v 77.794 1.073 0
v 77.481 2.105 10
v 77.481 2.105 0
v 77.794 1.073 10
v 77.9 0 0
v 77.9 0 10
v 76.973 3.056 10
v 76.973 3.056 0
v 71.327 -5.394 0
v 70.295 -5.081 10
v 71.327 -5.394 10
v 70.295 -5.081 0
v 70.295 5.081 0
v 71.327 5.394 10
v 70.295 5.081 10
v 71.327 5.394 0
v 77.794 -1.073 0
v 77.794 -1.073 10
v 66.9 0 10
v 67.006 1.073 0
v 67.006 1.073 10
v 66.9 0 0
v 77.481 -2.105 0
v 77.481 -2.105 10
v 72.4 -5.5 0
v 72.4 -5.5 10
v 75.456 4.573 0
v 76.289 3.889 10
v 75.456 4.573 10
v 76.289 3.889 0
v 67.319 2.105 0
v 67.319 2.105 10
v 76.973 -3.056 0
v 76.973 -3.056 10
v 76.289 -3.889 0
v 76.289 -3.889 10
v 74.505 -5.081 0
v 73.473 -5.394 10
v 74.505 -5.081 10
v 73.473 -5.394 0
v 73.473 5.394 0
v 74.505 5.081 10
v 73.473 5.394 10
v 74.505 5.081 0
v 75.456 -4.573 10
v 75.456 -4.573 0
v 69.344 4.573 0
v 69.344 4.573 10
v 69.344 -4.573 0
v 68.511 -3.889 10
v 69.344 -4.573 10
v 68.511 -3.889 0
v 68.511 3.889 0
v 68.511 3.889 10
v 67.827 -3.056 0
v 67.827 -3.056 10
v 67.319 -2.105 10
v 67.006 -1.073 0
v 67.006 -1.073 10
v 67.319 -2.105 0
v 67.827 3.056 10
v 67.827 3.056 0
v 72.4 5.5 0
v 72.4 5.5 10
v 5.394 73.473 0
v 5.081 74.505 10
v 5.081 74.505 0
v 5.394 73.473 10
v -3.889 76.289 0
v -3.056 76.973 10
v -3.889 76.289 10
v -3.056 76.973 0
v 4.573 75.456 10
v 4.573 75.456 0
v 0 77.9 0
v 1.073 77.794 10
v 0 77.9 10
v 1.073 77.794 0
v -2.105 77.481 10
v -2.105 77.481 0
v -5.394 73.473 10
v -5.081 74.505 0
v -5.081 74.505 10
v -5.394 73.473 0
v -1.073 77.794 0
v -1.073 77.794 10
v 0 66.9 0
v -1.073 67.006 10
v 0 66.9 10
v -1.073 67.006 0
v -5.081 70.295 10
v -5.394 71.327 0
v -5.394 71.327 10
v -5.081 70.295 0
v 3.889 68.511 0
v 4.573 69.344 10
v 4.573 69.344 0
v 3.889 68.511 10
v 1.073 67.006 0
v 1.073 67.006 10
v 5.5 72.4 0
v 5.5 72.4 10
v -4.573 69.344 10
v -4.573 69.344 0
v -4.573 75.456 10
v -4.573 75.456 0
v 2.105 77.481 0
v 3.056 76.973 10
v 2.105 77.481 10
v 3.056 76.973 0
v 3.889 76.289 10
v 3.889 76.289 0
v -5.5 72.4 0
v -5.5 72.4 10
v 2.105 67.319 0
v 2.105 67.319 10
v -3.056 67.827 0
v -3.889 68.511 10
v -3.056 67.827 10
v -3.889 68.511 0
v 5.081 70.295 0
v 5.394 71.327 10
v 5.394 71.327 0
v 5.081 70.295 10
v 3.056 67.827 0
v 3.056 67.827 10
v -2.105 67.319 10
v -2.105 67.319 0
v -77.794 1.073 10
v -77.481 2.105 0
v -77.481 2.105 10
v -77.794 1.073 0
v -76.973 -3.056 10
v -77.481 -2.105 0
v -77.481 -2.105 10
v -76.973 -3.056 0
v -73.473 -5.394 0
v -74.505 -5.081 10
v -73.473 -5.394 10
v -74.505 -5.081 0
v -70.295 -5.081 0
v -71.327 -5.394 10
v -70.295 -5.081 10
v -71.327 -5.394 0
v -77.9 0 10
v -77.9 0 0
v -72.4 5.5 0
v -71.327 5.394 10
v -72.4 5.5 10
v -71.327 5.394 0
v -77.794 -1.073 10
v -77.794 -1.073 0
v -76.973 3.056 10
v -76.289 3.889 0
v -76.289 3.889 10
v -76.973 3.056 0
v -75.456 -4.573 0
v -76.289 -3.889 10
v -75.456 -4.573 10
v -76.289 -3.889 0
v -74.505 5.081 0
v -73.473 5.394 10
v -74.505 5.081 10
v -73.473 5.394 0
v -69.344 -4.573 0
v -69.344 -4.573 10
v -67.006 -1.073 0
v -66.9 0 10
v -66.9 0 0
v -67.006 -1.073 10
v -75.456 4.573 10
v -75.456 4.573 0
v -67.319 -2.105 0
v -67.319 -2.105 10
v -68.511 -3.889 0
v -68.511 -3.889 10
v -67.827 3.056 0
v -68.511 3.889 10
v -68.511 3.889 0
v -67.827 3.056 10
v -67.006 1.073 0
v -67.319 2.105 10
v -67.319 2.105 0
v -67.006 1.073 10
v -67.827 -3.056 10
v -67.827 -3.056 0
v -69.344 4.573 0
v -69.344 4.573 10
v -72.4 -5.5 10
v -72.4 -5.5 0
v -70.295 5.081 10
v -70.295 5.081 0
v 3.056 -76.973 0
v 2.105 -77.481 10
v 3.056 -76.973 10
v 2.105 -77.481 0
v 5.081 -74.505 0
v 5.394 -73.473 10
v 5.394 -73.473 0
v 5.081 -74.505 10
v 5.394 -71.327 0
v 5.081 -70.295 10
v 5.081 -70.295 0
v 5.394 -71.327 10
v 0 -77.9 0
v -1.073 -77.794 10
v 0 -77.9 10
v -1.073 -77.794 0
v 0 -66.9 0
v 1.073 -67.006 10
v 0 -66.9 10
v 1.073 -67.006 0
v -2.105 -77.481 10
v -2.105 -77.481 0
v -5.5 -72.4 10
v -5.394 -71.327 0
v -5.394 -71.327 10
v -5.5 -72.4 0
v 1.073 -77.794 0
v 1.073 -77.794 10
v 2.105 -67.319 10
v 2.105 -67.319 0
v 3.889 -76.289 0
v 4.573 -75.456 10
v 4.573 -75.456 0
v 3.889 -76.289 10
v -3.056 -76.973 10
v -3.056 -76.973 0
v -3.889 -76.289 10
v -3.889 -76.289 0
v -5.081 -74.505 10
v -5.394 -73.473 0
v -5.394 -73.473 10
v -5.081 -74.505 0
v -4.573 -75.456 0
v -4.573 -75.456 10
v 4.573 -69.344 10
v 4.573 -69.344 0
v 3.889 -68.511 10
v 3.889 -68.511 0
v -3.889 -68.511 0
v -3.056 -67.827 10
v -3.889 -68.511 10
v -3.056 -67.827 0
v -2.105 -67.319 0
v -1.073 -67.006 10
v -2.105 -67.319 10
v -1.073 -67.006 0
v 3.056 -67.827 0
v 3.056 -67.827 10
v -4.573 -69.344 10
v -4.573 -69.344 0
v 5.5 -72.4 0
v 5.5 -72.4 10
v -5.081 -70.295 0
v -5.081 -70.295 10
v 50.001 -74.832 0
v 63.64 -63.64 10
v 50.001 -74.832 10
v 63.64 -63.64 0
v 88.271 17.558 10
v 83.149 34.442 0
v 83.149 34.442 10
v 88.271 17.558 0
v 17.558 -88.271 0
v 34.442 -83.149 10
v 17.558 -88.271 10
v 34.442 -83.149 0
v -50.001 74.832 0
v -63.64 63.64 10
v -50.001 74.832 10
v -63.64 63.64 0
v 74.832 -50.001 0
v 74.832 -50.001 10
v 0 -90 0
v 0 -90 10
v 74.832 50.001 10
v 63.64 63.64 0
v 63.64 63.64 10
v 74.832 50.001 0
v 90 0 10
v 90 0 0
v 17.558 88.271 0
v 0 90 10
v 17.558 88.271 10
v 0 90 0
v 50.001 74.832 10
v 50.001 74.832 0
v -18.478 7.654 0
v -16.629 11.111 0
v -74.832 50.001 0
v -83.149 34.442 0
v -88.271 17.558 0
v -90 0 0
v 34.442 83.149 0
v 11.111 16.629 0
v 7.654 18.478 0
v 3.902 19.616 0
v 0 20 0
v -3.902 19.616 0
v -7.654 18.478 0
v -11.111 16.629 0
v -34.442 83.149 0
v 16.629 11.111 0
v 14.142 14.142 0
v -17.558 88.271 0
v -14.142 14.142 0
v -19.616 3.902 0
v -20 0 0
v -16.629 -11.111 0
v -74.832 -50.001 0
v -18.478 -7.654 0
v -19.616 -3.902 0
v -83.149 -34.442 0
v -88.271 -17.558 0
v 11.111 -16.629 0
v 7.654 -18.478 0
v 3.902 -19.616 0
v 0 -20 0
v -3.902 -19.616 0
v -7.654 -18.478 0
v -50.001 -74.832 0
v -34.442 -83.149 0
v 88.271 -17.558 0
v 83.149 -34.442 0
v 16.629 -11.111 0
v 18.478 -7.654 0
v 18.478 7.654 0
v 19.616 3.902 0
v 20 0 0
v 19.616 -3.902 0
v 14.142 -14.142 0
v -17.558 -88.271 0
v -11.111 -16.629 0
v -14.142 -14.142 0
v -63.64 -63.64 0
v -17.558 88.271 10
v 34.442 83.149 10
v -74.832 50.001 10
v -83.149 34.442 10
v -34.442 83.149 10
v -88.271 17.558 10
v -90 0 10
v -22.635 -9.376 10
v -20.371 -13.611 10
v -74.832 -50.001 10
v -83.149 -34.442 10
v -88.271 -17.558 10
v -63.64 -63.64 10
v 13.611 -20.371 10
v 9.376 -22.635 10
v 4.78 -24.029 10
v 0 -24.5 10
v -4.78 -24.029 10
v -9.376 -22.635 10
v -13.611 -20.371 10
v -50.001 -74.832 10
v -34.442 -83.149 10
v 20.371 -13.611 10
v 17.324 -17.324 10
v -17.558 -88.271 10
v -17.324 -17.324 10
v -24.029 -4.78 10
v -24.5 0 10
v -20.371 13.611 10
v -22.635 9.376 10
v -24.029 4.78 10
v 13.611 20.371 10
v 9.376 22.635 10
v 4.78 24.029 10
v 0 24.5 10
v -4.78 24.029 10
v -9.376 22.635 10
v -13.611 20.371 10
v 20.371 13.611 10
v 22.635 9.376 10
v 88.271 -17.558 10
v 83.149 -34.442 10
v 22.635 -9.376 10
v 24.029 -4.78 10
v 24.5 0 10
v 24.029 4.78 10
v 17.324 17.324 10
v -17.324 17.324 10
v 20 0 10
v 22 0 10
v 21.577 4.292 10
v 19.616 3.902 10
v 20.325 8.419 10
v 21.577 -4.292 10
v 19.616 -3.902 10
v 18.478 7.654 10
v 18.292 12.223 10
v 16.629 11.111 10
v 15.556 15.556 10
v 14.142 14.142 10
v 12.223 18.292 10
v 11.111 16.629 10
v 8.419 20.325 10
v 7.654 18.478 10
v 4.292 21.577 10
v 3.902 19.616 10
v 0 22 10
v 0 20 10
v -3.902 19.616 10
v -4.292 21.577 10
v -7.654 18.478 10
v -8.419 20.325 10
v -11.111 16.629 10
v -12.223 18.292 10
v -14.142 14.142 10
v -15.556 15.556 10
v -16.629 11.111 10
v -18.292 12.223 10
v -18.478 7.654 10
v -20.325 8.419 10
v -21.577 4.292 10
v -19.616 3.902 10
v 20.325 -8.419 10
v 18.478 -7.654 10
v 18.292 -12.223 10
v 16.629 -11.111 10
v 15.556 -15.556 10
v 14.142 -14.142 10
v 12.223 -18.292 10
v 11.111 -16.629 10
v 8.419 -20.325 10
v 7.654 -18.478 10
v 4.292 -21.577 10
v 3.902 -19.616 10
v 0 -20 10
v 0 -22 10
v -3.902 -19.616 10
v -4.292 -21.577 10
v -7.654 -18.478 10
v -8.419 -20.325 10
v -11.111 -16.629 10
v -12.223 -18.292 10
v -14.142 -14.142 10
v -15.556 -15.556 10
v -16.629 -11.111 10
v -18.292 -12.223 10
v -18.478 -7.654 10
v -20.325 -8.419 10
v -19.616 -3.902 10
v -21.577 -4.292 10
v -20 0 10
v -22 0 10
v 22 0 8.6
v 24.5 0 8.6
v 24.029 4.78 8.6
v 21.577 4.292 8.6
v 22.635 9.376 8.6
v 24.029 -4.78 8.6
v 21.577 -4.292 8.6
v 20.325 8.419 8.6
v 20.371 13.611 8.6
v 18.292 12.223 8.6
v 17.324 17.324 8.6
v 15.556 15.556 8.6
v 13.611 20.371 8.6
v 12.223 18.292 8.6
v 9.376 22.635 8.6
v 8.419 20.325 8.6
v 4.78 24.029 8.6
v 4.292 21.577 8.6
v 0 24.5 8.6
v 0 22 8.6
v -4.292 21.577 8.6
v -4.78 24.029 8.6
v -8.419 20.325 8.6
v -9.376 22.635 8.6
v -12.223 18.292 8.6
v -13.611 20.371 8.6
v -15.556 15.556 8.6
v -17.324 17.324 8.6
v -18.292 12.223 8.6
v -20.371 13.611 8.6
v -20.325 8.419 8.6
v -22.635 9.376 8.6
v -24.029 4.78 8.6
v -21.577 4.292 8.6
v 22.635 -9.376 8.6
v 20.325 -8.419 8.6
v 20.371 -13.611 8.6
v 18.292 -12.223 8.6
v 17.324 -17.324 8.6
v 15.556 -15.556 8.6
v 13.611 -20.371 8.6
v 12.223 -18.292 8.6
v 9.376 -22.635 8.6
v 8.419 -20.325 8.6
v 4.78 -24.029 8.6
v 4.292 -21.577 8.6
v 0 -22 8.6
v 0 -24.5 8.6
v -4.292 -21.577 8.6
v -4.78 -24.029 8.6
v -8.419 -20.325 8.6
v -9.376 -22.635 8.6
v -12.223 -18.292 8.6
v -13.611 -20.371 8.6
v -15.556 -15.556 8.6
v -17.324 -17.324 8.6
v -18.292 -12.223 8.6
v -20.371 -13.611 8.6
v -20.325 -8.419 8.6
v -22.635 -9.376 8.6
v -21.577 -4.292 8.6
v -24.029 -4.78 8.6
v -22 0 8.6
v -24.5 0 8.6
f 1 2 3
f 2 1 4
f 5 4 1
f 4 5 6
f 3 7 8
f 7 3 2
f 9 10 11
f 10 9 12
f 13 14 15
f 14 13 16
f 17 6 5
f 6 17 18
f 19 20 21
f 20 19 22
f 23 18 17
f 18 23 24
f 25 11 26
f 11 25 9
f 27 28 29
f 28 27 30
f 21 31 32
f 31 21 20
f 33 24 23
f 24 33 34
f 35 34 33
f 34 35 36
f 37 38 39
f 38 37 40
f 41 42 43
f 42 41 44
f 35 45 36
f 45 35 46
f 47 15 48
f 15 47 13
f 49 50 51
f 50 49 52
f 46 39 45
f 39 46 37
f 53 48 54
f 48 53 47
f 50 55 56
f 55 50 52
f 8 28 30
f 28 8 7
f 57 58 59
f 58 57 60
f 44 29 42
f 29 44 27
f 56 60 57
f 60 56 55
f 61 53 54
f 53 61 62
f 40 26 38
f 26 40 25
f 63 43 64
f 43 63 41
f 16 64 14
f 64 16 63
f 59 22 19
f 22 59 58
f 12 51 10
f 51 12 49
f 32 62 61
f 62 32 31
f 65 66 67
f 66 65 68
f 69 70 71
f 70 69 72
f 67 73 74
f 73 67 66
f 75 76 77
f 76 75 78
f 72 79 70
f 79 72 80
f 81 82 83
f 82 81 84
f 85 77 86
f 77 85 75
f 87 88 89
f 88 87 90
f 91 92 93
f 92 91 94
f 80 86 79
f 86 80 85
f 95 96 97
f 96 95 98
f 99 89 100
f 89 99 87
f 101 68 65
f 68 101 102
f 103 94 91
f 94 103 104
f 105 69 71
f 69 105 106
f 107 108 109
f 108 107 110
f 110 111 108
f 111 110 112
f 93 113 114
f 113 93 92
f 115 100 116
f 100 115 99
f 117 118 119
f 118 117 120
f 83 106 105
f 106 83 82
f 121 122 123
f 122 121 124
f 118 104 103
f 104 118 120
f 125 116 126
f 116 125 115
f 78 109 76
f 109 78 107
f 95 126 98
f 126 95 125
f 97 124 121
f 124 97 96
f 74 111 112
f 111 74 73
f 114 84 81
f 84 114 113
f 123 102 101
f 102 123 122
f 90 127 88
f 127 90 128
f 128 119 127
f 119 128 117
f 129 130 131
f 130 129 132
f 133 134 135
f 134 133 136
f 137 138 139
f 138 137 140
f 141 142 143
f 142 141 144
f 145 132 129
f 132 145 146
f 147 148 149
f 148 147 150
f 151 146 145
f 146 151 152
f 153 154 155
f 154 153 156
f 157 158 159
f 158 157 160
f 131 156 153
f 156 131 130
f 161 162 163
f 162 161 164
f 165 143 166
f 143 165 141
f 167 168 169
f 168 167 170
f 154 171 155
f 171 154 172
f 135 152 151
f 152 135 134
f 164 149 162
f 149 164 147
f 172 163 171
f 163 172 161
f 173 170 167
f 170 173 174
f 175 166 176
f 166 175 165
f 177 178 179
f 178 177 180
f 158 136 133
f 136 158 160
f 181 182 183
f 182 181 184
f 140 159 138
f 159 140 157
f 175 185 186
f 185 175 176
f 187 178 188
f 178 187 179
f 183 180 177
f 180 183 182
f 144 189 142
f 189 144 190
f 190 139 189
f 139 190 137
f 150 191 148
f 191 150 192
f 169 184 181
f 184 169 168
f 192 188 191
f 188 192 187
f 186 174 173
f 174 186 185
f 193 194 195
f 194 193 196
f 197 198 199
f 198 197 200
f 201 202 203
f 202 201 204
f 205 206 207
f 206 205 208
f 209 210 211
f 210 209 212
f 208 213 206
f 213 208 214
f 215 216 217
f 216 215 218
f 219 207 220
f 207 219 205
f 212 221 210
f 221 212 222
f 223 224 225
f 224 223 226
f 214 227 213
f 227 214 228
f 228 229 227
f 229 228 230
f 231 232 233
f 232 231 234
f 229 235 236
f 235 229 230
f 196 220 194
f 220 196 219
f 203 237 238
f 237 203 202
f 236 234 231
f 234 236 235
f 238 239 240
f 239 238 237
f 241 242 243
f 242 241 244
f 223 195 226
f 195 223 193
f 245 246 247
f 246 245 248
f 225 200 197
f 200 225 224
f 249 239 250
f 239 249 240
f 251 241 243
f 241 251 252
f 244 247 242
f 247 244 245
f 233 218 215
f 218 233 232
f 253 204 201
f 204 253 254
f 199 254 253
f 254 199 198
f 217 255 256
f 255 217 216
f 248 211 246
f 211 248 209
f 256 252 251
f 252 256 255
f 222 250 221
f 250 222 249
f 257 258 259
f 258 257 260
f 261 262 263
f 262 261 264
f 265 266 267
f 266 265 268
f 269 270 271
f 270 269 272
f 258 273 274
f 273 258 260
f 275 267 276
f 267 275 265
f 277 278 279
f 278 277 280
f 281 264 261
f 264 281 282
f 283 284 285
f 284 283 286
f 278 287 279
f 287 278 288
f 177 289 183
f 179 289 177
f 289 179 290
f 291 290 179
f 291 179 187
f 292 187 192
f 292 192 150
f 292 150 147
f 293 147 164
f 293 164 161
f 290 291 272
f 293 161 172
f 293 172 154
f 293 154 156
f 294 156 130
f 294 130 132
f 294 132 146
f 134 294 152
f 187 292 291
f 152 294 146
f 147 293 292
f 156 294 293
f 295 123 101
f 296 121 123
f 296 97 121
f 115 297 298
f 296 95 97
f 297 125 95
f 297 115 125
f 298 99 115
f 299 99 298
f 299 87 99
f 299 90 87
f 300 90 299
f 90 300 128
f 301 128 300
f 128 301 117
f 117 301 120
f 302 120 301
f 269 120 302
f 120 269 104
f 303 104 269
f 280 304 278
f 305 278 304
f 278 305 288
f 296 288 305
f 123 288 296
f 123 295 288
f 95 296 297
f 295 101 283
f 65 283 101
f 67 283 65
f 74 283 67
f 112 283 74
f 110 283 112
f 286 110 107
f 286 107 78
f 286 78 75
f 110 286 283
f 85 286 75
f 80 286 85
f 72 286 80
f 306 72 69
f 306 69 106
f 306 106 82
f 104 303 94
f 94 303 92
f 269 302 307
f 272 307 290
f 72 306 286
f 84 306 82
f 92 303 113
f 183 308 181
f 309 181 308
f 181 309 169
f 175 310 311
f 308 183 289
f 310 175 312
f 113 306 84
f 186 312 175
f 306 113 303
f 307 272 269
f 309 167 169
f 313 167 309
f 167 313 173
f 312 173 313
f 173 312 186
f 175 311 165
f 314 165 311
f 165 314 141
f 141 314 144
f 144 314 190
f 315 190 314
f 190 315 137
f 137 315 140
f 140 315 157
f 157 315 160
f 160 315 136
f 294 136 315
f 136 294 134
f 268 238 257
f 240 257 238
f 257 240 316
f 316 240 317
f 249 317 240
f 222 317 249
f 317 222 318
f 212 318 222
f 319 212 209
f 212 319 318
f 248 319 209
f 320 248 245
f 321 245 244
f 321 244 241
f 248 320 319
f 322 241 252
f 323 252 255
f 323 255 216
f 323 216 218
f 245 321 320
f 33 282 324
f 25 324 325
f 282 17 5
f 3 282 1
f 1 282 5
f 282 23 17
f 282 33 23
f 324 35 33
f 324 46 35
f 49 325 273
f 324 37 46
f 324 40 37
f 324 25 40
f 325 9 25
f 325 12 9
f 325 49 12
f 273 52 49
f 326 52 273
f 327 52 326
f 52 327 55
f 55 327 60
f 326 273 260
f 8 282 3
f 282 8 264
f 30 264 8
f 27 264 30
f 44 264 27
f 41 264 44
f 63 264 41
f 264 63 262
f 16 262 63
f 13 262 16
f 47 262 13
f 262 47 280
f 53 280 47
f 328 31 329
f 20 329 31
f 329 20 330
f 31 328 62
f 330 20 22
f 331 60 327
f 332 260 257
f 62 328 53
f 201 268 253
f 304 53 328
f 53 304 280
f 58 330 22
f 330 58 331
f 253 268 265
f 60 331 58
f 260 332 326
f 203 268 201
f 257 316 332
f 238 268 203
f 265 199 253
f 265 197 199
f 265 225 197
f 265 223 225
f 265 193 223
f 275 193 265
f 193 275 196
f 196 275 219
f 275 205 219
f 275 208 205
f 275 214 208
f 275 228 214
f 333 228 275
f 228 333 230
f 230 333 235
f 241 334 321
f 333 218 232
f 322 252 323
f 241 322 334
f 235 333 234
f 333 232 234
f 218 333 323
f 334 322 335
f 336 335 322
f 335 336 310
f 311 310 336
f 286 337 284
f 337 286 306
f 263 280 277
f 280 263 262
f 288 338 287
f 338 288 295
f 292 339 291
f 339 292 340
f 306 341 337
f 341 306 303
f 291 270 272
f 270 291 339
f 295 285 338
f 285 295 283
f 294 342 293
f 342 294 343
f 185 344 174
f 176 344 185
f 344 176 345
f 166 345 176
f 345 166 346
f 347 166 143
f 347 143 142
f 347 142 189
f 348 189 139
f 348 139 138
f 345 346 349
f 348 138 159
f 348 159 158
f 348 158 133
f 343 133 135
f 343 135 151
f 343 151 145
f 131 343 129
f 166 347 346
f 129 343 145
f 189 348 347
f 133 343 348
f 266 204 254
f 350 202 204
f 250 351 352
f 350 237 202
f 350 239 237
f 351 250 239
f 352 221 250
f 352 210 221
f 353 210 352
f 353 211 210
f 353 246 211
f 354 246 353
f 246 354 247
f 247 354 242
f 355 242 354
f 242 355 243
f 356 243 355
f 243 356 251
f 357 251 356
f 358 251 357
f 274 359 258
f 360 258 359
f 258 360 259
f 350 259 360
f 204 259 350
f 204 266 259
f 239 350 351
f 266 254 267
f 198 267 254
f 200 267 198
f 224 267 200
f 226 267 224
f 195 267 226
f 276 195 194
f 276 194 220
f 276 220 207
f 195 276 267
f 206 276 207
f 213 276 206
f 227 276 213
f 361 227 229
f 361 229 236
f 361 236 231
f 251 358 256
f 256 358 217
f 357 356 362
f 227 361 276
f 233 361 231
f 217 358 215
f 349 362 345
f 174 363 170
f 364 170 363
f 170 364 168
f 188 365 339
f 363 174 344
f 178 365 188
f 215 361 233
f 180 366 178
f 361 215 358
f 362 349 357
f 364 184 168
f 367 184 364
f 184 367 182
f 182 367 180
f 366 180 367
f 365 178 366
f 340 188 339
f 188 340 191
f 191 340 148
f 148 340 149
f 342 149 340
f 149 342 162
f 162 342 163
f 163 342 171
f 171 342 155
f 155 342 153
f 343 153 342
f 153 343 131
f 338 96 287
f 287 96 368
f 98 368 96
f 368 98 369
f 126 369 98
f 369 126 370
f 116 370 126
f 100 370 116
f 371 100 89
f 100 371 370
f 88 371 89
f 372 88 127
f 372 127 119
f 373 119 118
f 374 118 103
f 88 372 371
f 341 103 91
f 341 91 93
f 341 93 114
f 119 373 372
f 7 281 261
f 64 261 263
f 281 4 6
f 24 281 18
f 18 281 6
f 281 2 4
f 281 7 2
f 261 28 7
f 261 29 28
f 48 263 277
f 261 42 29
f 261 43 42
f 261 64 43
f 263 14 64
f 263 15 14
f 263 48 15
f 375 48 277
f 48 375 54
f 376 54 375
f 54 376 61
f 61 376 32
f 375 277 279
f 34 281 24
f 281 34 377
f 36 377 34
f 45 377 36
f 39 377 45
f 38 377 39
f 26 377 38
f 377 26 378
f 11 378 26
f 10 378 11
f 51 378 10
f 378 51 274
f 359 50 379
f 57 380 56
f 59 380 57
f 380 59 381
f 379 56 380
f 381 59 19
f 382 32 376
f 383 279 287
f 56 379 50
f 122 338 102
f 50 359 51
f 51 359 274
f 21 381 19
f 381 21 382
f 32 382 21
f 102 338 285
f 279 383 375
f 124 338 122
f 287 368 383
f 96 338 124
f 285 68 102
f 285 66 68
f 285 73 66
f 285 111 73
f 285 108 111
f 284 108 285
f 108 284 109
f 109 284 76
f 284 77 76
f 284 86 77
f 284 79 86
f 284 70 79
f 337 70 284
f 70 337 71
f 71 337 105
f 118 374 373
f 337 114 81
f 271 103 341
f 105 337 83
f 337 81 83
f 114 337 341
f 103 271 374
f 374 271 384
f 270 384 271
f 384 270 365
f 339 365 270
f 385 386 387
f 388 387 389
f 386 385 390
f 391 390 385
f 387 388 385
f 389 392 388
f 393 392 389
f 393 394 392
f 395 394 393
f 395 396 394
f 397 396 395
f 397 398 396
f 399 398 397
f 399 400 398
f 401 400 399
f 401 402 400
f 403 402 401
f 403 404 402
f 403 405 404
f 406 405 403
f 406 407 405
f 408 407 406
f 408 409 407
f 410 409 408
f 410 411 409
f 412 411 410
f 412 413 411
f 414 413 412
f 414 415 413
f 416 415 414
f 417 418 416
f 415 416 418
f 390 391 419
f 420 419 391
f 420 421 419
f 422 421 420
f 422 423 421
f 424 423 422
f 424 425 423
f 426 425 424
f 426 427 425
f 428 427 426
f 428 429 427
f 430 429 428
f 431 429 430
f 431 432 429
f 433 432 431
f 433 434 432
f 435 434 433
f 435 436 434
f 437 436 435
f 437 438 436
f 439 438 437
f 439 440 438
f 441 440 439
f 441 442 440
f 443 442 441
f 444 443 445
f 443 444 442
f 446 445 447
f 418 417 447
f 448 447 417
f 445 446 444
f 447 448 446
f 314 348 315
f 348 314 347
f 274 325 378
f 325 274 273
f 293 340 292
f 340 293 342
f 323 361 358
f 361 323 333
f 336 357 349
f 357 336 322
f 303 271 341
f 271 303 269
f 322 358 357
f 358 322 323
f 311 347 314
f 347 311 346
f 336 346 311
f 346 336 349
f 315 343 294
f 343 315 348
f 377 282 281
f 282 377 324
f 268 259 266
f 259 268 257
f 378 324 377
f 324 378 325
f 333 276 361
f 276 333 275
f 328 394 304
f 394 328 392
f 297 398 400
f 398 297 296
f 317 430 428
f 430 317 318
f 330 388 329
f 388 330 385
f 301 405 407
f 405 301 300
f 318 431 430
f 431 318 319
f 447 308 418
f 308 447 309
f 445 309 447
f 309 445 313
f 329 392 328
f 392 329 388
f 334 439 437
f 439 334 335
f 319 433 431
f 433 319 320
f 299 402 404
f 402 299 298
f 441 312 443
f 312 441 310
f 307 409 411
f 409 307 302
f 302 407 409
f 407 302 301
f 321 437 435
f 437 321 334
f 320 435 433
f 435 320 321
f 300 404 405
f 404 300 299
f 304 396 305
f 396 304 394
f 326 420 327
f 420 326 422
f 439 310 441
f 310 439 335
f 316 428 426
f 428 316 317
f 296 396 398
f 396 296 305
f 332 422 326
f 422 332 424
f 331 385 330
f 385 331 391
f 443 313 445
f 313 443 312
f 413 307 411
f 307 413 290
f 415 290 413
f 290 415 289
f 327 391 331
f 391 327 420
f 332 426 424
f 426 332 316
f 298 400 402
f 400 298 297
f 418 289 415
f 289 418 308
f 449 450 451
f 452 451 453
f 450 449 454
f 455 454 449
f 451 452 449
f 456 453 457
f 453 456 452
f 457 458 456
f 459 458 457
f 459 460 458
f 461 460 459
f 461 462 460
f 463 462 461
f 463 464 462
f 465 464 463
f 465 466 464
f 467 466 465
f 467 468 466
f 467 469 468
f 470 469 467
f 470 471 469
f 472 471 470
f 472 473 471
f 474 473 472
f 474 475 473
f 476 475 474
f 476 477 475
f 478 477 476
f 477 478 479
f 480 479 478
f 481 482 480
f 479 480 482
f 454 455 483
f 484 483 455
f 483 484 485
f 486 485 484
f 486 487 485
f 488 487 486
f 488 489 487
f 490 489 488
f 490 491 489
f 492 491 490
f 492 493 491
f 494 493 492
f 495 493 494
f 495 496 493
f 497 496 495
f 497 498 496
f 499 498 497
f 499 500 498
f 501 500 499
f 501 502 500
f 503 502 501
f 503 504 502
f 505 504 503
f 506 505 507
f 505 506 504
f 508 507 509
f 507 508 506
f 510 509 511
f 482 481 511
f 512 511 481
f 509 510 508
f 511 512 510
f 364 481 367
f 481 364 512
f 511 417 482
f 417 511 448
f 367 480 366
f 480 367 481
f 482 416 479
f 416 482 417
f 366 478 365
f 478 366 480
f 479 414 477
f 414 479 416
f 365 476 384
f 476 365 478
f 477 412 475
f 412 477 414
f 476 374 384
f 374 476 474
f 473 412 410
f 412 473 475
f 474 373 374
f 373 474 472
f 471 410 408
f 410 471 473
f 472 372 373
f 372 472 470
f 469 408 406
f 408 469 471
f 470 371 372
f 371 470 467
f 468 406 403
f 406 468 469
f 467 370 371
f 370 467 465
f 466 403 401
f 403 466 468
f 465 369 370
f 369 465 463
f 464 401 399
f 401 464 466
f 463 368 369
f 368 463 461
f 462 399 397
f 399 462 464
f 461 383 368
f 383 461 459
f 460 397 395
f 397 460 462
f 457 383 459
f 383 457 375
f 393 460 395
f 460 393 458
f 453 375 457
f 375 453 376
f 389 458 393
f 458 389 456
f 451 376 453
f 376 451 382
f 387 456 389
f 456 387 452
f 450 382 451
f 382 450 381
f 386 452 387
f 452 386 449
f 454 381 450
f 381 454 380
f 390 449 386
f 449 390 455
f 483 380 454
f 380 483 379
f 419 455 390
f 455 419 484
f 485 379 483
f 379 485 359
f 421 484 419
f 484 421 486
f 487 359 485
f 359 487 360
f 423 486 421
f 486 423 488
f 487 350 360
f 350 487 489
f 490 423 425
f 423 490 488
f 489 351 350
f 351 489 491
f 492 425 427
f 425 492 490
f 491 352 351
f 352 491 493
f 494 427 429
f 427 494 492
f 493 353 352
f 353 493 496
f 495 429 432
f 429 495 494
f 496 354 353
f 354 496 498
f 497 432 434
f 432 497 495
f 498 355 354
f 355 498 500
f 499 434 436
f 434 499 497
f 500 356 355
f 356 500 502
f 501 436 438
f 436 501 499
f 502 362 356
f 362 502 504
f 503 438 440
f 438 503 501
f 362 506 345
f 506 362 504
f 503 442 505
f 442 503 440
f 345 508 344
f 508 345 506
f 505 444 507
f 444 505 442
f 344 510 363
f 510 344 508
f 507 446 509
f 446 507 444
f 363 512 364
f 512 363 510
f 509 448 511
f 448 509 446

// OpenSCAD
$fn = 32;

// ----------------------------------------------------------------------
// Bolt-circle flange: 180 mm outside, 4 bolt holes, bore 40 mm
// ----------------------------------------------------------------------

// --- parameters (mm) ---
flange_d = 180;           // flange outside diameter
flange_t = 10;            // flange thickness
bolts = 4;                // number of bolt holes
bolt_d = 11;              // bolt clearance
bolt_r = 72.4;            // bolt circle radius
bore_d = 40;              // centre bore
groove_w = 2.5;           // gasket groove width
groove_d = 1.4;           // gasket groove depth
groove_r = 22;            // groove radius
groove_z = 8.6;           // groove floor depth from the face

module body() {
  cylinder(h = flange_t, d = flange_d);
}

difference() {
  body();
  /* bolt circle */
  for (i = [0 : bolts - 1]) rotate([0, 0, i * 360 / bolts]) translate([bolt_r, 0, -1]) cylinder(h = flange_t + 3, d = bolt_d);
  translate([0, 0, -1]) cylinder(h = flange_t + 3, d = bore_d);
  /* gasket groove on the front face */
  rotate_extrude() translate([groove_r, groove_z]) square([groove_w, groove_d + 1]);
}
